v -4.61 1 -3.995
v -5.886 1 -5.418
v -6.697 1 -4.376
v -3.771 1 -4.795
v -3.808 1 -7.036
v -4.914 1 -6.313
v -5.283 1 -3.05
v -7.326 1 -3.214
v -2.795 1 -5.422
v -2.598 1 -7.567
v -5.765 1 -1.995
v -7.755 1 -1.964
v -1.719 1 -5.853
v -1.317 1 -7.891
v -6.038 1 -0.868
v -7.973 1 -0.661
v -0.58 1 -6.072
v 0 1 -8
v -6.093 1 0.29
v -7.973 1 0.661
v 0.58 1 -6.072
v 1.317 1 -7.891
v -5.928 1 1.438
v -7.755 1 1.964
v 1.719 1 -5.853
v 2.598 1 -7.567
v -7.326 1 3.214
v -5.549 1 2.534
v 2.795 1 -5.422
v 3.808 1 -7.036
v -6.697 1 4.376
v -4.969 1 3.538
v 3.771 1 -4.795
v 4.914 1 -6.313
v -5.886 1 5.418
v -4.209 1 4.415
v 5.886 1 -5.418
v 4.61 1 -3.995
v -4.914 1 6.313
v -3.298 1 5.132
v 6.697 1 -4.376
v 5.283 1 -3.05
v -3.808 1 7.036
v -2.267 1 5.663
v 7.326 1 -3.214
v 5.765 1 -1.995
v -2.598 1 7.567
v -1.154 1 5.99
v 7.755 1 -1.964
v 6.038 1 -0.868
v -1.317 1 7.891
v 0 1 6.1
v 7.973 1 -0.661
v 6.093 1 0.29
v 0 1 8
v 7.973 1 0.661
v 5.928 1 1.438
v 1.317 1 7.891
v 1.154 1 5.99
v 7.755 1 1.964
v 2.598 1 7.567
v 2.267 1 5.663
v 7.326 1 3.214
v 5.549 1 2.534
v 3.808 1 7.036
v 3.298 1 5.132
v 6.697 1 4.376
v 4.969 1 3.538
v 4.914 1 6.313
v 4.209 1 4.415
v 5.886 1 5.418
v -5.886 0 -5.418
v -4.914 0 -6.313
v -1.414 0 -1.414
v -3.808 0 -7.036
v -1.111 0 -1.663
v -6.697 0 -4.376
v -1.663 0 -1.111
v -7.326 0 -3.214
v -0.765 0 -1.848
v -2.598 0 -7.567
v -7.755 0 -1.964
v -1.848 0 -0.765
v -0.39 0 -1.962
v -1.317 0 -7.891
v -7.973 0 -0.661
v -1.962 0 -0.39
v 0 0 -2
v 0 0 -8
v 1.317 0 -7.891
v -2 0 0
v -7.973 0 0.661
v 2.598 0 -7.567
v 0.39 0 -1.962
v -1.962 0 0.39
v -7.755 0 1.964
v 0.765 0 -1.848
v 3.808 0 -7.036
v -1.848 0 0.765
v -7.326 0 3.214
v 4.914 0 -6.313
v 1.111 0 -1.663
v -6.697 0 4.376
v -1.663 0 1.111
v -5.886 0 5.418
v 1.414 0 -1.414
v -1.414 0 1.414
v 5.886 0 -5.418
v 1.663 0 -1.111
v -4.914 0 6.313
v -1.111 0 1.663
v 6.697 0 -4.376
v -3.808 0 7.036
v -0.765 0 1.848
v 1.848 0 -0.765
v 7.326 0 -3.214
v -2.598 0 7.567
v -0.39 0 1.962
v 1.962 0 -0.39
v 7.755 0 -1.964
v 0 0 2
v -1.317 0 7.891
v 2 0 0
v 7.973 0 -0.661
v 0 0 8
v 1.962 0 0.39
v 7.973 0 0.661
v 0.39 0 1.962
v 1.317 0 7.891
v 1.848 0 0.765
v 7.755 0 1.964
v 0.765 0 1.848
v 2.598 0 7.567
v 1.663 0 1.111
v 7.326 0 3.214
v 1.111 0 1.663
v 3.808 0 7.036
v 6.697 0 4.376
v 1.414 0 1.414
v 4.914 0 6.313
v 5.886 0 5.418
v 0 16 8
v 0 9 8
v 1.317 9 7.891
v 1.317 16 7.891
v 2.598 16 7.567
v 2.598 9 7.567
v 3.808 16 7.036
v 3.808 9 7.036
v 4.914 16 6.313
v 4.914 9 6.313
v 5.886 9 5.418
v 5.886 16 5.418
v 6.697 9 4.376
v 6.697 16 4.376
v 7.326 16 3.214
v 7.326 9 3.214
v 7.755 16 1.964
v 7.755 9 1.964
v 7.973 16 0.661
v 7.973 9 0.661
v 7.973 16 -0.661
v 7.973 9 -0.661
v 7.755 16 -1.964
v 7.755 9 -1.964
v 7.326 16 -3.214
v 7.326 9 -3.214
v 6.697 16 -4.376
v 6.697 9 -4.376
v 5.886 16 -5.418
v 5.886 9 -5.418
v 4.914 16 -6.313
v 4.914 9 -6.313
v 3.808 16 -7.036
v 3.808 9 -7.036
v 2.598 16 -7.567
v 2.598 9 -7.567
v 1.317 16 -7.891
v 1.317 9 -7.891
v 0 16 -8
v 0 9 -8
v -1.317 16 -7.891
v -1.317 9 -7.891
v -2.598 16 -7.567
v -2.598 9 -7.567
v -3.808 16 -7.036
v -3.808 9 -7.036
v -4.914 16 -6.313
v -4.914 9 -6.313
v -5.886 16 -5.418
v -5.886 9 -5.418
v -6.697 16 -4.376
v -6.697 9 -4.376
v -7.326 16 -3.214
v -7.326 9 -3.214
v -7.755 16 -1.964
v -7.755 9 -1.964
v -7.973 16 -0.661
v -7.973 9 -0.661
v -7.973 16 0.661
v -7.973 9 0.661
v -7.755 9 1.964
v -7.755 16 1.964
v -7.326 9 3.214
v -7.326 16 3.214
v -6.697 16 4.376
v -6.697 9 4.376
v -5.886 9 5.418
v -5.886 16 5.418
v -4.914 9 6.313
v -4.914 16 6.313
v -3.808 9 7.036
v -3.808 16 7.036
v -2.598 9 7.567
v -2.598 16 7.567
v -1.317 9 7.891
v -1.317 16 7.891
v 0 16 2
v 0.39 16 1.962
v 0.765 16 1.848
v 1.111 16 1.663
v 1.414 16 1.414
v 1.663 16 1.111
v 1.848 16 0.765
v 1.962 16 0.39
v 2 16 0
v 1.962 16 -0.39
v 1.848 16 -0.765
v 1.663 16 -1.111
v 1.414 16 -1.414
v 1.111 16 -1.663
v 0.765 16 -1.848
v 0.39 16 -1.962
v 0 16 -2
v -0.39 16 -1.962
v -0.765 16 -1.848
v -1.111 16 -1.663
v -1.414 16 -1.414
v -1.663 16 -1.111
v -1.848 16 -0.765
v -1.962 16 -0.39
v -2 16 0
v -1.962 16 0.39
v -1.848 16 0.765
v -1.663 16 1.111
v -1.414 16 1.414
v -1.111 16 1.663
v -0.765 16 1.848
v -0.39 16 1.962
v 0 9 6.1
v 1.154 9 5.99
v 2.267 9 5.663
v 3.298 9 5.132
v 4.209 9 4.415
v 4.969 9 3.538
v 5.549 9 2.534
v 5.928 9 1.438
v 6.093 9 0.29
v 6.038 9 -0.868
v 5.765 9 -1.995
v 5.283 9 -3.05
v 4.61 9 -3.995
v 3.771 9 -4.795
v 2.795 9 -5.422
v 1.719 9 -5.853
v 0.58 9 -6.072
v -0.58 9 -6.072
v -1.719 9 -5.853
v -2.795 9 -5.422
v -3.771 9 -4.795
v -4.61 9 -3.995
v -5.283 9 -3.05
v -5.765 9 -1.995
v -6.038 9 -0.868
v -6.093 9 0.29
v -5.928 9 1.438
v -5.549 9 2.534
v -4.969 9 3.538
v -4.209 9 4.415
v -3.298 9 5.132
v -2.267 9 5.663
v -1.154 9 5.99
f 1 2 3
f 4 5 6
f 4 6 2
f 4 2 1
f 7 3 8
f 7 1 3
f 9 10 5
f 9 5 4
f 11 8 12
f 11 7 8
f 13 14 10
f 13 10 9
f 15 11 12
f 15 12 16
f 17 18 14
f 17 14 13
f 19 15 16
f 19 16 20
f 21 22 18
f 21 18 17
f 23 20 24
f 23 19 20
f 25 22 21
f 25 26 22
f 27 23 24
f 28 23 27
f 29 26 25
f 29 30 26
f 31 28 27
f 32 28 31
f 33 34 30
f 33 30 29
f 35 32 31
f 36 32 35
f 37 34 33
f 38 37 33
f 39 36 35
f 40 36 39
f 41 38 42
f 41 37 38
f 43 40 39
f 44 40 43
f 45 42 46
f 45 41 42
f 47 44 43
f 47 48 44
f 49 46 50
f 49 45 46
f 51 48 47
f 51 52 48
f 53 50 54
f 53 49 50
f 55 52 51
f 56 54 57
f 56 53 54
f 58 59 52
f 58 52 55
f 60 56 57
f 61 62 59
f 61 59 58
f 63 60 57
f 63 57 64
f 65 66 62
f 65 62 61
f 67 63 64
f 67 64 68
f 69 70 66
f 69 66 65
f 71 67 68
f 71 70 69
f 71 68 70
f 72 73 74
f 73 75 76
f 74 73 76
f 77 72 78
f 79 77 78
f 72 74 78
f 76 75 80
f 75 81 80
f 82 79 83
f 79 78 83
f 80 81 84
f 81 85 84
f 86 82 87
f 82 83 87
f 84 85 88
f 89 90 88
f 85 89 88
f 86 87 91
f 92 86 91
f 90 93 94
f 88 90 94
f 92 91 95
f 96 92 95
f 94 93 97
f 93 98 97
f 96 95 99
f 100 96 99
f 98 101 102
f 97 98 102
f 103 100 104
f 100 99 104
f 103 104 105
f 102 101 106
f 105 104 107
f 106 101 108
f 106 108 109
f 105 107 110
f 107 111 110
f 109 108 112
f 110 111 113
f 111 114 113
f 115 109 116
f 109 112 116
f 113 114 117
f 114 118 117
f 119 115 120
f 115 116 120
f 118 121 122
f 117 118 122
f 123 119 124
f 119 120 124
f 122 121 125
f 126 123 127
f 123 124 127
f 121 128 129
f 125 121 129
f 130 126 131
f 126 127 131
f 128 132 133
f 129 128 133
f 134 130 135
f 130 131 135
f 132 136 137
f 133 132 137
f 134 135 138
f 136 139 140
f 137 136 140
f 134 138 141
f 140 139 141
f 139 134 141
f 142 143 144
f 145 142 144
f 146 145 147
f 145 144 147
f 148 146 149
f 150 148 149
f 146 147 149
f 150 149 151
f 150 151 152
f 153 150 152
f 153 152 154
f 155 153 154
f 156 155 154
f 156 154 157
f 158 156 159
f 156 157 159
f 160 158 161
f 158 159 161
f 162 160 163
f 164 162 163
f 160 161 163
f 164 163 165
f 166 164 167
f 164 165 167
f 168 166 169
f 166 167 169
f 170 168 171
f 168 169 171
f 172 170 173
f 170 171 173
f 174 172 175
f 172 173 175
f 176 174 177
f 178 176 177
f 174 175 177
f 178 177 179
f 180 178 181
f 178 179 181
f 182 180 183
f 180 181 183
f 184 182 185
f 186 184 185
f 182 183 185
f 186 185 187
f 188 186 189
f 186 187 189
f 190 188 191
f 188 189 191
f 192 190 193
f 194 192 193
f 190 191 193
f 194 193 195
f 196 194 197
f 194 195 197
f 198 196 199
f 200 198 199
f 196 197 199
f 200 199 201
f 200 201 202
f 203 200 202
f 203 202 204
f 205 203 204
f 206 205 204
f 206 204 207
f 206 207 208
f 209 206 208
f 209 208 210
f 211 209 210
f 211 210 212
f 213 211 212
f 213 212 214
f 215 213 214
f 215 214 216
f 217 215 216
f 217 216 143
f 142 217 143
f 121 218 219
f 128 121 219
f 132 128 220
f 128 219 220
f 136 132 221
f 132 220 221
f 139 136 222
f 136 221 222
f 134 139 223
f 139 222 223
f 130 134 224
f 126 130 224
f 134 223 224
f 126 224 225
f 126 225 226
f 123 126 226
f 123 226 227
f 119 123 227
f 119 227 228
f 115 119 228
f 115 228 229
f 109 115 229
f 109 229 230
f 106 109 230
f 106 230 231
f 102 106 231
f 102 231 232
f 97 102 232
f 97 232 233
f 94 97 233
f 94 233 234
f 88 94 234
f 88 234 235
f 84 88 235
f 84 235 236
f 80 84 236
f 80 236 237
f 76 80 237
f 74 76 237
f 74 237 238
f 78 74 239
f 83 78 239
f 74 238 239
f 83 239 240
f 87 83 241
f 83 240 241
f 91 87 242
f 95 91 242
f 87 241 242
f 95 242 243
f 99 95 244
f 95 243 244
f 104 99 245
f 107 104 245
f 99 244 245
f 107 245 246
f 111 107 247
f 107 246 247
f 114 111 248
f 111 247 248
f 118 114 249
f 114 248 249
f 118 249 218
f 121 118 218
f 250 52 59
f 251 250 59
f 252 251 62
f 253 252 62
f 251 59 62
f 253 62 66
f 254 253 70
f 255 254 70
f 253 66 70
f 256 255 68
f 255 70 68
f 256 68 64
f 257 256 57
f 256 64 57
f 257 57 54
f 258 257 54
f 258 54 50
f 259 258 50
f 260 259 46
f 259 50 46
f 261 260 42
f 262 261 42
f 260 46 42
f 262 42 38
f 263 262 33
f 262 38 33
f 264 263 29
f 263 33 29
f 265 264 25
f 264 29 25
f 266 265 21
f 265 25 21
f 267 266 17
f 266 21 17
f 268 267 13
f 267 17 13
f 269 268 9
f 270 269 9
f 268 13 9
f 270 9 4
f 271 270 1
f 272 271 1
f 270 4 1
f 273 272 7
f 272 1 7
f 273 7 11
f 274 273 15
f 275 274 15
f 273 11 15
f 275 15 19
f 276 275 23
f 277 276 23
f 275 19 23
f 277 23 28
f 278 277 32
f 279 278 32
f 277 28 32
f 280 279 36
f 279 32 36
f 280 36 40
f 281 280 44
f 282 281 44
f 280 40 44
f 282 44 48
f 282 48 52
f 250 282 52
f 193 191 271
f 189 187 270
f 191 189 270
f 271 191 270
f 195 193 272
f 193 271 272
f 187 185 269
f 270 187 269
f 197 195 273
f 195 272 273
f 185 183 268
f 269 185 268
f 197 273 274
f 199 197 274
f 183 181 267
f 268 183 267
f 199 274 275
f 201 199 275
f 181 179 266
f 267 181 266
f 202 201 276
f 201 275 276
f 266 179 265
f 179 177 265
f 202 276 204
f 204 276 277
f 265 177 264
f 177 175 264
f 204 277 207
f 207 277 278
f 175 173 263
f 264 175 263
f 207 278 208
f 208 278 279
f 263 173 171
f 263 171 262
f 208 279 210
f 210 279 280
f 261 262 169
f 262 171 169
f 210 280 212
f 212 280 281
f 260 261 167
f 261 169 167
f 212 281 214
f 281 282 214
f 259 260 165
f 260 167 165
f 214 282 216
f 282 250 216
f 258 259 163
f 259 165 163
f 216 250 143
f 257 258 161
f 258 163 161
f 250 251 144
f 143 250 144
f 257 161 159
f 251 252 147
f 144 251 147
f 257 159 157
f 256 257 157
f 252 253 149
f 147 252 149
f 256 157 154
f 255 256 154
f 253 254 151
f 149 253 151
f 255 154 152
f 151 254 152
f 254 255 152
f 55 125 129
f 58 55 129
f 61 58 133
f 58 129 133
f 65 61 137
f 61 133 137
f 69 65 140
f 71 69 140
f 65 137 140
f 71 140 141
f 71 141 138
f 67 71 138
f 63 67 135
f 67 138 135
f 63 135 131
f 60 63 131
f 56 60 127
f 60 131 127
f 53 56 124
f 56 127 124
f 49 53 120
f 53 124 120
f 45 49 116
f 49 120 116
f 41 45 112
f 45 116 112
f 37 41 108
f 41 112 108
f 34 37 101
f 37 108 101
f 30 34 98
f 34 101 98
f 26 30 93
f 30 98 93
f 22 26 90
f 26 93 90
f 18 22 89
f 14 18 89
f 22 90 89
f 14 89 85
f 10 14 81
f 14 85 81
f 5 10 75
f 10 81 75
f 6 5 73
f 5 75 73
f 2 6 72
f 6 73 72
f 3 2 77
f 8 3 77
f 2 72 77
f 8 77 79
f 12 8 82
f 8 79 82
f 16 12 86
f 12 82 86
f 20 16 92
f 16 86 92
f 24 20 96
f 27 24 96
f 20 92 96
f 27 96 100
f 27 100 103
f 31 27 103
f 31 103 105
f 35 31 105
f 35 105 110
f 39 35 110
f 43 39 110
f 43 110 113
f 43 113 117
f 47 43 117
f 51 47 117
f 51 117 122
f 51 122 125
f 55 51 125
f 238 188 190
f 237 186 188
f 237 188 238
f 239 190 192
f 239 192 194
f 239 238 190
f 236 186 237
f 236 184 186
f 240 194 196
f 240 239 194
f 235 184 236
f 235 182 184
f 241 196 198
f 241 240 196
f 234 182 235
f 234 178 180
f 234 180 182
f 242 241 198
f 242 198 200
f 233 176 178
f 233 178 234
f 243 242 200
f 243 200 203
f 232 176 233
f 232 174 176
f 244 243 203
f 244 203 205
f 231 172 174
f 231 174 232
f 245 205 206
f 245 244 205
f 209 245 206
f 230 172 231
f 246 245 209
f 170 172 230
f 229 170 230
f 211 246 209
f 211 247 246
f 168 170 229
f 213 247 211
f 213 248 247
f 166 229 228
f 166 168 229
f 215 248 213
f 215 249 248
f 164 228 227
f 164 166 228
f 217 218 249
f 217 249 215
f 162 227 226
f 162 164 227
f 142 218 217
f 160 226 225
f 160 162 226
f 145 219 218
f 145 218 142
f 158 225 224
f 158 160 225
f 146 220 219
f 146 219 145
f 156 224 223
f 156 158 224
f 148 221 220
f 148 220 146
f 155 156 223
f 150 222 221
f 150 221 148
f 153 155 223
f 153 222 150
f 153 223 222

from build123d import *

# Parameters (mm, degrees)
ESQUISSE1_R      = 8
EXTRUSION1_DEPTH = 1
ESQUISSE2_R      = 6.1
EXTRUSION2_DEPTH = 8
ESQUISSE3_R      = 8
EXTRUSION3_DEPTH = 7
ESQUISSE4_R      = 2
EXTRUSION4_DEPTH = 20.595917942


with BuildPart() as part:
    # Esquisse1 → Extrusion1 (new body)
    with BuildSketch(Plane(origin=(0, 0, 0), x_dir=(1, 0, 0), z_dir=(0, 1, 0))):
        with Locations(Location((0, 0, 0), (0, 0, 270))):
            Circle(ESQUISSE1_R)
    extrude(amount=EXTRUSION1_DEPTH)

    # Esquisse2 → Extrusion2 (add)
    with BuildSketch(Plane(origin=(0, 1, 0), x_dir=(-1, 0, 0), z_dir=(0, 1, 0))):
        with Locations(Location((0, 0, 0), (0, 0, 90))):
            Circle(ESQUISSE2_R)
    extrude(amount=EXTRUSION2_DEPTH)

    # Esquisse3 → Extrusion3 (add)
    with BuildSketch(Plane(origin=(0, 9, 0), x_dir=(-1, 0, 0), z_dir=(0, 1, 0))):
        with Locations(Location((0, 0, 0), (0, 0, 90))):
            Circle(ESQUISSE3_R)
    extrude(amount=EXTRUSION3_DEPTH)

    # Esquisse4 → Extrusion4 (cut, through all)
    with BuildSketch(Plane(origin=(0, 16, 0), x_dir=(-1, 0, 0), z_dir=(0, 1, 0))):
        with Locations(Location((0, 0, 0), (0, 0, 90))):
            Circle(ESQUISSE4_R)
    extrude(amount=-EXTRUSION4_DEPTH, mode=Mode.SUBTRACT)


solid = part.part
